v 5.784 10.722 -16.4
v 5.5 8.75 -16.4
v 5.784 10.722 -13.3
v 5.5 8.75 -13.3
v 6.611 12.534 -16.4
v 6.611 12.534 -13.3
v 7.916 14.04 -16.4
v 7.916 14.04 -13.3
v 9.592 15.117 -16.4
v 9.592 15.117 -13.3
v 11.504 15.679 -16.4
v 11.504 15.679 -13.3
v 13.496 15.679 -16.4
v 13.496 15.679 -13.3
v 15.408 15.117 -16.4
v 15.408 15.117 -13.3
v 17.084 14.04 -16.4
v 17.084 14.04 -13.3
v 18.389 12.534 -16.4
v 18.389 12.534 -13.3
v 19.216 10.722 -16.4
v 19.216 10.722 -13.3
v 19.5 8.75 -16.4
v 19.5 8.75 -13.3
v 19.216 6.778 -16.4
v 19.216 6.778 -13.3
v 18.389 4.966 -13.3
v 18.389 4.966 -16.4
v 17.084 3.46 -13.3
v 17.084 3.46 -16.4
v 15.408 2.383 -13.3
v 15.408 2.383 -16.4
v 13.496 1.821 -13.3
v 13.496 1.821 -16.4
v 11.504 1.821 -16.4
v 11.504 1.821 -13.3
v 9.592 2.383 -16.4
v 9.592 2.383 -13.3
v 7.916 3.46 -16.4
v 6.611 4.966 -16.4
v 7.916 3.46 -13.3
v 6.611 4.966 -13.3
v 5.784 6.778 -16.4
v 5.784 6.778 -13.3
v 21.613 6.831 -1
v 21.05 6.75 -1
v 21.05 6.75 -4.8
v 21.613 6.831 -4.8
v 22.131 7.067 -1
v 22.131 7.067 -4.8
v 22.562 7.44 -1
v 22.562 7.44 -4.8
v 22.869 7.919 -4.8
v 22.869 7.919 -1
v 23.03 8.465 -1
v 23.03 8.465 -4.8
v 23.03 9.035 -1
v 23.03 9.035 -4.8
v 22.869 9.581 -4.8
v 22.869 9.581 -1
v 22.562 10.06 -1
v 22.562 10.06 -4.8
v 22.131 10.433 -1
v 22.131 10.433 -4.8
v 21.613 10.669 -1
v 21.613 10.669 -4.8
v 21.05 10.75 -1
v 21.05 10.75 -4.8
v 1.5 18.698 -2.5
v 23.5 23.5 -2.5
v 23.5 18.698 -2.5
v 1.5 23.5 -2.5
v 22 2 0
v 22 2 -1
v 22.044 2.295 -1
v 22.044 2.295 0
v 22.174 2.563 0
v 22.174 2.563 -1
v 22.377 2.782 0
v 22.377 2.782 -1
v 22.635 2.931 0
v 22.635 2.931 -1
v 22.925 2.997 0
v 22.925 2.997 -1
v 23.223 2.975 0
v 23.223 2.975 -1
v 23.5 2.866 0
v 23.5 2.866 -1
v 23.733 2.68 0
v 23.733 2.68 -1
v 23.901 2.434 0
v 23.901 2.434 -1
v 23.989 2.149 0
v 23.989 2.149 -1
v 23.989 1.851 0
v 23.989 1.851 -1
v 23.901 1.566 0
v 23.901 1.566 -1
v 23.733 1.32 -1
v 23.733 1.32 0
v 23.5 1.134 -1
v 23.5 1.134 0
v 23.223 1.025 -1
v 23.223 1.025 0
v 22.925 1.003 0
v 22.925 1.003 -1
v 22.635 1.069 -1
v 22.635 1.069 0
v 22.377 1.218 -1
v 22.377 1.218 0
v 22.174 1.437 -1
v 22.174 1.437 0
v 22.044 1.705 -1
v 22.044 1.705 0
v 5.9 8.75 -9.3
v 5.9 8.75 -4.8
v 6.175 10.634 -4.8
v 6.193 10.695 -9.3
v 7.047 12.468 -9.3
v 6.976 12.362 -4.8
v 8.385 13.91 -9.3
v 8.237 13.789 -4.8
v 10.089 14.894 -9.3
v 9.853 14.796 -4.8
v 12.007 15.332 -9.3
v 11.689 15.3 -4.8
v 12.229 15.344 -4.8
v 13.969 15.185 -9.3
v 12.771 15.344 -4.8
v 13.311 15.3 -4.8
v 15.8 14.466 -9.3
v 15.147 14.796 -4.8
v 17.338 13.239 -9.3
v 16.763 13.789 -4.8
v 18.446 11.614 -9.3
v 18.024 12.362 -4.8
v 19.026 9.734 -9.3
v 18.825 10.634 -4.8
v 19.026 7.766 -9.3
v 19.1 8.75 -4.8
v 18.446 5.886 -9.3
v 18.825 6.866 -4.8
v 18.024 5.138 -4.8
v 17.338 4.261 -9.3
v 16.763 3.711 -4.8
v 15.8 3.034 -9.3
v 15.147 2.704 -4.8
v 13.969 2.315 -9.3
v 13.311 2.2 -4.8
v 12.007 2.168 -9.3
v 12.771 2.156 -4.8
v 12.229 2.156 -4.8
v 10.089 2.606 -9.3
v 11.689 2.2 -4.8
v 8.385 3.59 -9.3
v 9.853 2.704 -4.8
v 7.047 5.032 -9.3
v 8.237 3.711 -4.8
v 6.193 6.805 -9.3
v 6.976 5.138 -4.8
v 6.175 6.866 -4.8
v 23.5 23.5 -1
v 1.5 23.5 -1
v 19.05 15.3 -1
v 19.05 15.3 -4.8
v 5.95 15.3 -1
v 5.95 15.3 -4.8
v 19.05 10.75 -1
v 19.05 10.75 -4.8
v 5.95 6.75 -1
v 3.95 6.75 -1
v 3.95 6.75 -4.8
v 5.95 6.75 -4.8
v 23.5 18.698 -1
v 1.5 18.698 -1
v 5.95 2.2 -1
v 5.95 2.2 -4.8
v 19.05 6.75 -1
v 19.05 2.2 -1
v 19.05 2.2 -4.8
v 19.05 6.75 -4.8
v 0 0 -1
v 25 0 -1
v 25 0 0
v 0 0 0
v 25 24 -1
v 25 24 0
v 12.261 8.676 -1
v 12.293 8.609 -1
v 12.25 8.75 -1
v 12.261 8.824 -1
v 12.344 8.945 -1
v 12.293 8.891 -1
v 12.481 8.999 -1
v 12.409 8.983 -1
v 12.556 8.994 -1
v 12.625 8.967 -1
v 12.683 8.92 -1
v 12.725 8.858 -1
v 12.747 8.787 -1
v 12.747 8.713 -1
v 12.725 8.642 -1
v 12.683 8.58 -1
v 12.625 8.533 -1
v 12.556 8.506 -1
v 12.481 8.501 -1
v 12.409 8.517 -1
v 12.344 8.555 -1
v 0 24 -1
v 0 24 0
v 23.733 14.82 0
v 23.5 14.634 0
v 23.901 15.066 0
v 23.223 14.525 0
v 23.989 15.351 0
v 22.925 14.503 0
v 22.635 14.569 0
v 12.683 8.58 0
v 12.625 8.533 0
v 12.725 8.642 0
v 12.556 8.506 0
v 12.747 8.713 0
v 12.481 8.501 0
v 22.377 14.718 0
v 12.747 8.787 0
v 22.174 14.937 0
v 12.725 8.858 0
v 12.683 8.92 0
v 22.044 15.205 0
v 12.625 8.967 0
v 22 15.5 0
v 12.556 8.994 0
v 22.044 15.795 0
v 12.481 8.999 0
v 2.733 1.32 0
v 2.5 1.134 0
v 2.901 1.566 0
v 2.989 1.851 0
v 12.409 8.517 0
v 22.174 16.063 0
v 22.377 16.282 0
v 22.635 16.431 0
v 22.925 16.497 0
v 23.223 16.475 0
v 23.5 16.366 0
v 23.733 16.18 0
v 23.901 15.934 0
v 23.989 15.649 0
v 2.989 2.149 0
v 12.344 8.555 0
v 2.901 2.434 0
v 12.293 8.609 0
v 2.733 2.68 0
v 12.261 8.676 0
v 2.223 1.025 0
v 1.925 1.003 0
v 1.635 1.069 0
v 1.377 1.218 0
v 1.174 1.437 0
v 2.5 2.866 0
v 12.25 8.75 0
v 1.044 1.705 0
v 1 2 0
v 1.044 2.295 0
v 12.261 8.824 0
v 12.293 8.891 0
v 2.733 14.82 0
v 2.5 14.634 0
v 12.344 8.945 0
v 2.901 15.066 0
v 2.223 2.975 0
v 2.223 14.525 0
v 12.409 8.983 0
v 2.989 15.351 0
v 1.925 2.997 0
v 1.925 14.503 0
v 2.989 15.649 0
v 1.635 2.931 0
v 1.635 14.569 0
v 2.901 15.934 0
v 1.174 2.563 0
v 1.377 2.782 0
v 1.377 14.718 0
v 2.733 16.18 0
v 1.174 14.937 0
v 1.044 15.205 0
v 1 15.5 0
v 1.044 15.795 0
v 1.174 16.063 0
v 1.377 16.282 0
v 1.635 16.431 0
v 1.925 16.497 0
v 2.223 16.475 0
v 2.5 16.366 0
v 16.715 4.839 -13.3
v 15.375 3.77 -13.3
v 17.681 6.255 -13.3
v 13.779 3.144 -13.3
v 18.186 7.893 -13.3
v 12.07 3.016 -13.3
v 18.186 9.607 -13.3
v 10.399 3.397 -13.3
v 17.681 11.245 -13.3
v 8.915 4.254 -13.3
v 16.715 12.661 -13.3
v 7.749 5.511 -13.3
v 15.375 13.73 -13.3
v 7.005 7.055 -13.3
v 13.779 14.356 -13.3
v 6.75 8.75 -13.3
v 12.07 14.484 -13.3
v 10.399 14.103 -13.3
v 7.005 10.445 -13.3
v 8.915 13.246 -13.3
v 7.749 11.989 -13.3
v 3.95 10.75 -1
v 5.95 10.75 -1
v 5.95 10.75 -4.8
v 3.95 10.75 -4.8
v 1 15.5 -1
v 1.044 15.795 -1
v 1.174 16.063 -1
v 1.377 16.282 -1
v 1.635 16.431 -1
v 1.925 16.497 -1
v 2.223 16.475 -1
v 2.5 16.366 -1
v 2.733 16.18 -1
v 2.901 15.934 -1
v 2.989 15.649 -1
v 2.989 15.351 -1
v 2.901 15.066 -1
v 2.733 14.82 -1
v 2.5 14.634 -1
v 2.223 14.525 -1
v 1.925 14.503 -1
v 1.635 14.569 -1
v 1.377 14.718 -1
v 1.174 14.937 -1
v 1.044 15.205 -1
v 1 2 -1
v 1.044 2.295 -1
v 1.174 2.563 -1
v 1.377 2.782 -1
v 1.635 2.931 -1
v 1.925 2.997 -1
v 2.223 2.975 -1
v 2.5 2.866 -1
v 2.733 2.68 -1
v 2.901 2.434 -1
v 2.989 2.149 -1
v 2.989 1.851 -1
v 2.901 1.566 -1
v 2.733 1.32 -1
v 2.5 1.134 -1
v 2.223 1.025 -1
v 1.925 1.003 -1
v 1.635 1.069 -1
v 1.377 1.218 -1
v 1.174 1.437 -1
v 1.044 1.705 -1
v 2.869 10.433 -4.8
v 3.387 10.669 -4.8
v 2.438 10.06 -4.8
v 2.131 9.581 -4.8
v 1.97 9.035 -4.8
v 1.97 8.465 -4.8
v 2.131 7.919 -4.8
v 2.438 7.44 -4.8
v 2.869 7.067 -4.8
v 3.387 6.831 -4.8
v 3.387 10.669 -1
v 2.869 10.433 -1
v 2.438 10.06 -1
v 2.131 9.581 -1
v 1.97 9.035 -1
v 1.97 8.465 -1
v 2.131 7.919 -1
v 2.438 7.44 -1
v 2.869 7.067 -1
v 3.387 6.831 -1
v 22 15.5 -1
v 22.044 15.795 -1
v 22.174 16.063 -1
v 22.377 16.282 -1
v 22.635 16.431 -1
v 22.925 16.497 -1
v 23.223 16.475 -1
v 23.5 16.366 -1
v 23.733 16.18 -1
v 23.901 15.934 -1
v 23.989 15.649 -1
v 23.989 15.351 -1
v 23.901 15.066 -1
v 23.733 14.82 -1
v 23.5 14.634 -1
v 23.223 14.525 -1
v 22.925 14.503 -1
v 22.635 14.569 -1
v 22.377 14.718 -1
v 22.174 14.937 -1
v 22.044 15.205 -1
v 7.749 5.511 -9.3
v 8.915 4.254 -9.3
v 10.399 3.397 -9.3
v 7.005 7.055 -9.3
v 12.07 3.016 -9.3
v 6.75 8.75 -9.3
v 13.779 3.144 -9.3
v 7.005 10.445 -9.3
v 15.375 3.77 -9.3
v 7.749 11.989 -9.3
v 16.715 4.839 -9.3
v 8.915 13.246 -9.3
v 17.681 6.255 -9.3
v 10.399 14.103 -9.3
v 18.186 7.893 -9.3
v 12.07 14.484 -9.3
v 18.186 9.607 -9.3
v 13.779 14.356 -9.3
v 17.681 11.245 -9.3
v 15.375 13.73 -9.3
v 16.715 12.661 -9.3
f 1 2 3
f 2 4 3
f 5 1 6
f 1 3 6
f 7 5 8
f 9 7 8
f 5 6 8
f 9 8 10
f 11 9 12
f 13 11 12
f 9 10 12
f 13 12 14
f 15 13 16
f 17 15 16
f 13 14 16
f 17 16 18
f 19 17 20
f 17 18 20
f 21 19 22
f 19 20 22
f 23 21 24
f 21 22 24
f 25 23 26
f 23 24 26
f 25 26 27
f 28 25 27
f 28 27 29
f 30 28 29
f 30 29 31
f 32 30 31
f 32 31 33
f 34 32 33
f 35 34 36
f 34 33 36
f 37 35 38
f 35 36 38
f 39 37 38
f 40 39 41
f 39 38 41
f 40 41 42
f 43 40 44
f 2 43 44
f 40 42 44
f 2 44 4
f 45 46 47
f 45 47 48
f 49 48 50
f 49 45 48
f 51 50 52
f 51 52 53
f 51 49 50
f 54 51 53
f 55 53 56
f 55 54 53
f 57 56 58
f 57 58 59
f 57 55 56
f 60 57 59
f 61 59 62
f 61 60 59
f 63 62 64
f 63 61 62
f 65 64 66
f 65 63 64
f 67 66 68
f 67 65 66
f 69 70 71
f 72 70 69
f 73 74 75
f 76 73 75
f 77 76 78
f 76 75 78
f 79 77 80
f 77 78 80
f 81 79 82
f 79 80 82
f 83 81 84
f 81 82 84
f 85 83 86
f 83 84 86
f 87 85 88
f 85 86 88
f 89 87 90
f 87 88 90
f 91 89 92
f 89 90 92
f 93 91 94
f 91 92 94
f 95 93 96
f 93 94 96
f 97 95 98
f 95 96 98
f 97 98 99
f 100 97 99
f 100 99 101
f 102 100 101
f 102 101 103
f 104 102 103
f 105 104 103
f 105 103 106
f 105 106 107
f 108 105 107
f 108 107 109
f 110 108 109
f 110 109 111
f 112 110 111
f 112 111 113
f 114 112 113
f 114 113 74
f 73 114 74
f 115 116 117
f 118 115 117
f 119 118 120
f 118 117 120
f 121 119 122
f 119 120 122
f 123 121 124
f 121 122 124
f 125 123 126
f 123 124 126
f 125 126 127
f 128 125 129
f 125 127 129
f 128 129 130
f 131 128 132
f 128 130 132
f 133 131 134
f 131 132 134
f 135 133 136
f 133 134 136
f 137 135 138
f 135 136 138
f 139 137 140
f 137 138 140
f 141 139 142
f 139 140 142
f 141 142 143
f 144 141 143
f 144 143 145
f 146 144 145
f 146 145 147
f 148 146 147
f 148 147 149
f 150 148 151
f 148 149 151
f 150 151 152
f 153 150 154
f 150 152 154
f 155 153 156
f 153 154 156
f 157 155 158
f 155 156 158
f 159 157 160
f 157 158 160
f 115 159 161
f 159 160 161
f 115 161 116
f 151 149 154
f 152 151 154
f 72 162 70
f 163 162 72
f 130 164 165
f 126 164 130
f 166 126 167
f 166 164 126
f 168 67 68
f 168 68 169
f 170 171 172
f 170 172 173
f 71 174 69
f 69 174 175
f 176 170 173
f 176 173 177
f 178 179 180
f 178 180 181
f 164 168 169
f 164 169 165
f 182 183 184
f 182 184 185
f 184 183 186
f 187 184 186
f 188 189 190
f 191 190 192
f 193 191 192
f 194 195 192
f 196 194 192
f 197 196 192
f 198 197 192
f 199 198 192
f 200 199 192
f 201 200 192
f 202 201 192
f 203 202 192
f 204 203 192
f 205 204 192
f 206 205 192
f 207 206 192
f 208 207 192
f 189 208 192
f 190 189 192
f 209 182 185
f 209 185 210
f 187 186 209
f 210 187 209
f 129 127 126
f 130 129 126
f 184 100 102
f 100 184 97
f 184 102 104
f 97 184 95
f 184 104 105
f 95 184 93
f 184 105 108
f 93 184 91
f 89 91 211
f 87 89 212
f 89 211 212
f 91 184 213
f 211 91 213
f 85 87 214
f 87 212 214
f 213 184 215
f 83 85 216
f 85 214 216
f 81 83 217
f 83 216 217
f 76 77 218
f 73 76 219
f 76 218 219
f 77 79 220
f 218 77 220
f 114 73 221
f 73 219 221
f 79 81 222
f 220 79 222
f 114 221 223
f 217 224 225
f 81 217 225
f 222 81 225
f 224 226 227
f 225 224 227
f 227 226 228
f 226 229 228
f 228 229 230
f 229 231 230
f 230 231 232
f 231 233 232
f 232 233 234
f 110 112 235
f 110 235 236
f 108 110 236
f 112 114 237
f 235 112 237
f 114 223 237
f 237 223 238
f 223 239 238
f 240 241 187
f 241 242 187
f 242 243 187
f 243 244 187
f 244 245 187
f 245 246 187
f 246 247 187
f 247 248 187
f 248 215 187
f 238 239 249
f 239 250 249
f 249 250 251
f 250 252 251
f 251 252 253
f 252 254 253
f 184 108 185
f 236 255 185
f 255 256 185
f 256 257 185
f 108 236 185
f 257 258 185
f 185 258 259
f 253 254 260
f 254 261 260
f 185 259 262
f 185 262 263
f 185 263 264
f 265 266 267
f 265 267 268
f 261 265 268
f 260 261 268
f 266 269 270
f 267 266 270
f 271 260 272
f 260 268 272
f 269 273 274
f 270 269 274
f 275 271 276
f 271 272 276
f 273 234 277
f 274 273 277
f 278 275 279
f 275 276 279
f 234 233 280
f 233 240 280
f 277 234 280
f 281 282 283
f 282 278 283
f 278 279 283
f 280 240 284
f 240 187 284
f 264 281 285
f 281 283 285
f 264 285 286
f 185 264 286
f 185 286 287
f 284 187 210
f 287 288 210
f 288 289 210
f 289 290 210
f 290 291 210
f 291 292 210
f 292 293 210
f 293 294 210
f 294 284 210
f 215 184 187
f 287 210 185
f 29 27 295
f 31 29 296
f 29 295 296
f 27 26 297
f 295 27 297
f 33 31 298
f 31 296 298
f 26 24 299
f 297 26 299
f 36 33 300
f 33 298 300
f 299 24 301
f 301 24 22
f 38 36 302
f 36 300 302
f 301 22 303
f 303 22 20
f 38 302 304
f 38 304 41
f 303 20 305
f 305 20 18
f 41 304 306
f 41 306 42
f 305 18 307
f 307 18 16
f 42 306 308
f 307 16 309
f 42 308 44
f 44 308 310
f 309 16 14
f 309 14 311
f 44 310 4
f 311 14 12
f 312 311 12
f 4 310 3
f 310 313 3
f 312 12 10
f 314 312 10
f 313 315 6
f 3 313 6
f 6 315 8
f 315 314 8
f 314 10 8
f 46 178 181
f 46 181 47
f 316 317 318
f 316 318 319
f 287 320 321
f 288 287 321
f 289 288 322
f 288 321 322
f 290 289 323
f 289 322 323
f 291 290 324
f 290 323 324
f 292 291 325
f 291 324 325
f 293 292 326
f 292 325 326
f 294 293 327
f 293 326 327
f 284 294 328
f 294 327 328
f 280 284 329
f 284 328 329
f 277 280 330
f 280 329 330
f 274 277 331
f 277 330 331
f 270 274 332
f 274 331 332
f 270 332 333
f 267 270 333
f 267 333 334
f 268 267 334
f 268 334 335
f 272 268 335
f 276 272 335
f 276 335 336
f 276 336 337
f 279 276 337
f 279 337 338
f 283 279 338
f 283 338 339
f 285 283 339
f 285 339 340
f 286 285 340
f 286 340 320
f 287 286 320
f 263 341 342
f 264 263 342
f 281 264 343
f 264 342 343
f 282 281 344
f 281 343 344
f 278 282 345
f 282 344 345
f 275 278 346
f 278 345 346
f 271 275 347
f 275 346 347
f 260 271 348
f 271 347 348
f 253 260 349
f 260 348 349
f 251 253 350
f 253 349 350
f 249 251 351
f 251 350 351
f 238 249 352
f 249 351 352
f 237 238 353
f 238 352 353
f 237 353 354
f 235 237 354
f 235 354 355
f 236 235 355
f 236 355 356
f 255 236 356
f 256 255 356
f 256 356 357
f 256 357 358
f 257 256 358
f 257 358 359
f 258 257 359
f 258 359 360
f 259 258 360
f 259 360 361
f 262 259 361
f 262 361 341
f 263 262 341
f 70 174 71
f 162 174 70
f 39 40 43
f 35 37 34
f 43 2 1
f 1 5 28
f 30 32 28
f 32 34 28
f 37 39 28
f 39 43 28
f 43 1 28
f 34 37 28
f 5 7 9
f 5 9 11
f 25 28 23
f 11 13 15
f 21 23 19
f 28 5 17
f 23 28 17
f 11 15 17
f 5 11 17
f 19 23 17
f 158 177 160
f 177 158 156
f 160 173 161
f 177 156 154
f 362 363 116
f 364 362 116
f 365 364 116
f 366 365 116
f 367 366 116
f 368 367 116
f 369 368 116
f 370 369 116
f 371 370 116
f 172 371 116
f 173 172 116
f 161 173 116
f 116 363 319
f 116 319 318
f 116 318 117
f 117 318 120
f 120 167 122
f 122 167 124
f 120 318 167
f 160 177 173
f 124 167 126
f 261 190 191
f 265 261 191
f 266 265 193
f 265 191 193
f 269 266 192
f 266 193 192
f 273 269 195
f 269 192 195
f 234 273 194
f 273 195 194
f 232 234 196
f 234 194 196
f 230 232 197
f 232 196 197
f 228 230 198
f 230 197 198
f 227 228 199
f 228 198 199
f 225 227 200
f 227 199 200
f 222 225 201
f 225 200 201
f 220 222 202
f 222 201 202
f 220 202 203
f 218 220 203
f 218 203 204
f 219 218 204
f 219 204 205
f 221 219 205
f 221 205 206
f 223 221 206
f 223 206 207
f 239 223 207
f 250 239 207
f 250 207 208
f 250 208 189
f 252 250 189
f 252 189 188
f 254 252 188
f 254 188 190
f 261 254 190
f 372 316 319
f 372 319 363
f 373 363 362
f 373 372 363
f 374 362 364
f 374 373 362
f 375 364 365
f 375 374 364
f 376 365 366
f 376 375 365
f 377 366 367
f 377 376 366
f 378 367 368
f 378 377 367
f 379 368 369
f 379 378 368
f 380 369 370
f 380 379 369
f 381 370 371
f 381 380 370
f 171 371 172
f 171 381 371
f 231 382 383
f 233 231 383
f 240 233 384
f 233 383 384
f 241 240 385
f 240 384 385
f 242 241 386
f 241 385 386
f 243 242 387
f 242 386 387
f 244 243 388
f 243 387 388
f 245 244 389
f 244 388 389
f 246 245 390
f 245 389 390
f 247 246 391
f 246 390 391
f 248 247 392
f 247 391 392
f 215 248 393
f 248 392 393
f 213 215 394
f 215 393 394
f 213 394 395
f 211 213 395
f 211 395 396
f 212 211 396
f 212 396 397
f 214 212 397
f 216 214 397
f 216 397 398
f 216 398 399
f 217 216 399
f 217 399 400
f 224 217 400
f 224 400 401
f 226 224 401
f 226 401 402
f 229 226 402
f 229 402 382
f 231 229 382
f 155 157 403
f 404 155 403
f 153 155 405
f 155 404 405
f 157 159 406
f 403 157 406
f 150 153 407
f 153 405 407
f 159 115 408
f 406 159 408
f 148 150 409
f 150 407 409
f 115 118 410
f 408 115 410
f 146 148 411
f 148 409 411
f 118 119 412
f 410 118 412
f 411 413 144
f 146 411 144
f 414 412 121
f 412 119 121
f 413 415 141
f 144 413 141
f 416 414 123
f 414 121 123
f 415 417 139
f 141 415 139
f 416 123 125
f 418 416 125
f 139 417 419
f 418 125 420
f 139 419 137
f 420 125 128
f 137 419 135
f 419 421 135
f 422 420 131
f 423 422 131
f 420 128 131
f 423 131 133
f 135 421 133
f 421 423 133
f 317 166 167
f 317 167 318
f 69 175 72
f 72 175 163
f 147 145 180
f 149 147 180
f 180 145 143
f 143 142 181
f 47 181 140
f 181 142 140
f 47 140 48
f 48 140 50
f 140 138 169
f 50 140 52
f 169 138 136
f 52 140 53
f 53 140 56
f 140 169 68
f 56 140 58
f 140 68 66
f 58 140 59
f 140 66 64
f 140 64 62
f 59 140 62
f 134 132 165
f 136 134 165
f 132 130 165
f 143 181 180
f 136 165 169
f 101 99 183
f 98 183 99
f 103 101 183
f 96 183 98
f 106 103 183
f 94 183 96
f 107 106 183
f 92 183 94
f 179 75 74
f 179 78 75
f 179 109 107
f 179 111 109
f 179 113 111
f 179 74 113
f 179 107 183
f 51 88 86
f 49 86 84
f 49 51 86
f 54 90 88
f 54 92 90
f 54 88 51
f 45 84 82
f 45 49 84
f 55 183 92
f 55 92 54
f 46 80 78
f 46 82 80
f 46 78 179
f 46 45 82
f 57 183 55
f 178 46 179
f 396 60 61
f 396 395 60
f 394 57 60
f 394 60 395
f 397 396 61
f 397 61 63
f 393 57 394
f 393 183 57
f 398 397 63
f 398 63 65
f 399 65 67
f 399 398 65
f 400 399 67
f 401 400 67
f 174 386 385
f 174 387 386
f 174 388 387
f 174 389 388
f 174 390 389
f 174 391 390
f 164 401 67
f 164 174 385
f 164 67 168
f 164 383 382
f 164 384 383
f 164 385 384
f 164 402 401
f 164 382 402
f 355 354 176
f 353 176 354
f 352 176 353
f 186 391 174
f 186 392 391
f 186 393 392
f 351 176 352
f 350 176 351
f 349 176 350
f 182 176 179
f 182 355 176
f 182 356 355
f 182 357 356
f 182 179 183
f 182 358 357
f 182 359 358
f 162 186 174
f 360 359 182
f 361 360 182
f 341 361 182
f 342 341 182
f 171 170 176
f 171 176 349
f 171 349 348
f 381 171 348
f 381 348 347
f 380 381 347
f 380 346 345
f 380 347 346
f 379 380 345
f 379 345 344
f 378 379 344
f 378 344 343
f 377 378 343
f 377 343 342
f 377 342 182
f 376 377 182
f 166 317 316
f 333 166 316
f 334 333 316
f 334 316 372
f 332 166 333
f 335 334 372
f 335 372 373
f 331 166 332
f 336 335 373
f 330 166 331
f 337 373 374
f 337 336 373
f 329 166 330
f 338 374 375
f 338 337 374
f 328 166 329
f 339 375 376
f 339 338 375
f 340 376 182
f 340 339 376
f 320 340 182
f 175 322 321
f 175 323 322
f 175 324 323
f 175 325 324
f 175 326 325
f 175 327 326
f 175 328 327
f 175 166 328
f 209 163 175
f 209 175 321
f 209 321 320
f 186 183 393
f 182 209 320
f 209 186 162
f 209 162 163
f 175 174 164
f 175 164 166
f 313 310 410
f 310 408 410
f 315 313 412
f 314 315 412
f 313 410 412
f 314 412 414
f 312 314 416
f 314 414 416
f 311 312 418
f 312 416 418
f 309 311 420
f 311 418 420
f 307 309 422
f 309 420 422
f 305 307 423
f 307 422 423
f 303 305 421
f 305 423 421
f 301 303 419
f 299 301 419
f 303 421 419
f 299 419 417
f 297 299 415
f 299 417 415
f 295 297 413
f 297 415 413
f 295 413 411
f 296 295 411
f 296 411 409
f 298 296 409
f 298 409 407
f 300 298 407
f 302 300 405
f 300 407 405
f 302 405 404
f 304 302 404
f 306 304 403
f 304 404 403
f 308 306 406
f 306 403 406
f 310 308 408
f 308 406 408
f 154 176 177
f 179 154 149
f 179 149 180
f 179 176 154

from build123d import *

# Parameters (mm, degrees)
SKETCH_1_W             = 25
SKETCH_1_H             = 24
EXTRUDE_271_DEPTH      = 1
EXTRUDE_458_DEPTH      = 3.8
SKETCH_3_W             = 22
SKETCH_3_H             = 4.802295703
EXTRUDE_725_DEPTH      = 1.5
HOLE_WIZARD_886_D      = 0.5
HOLE_WIZARD_886_DEPTH  = 1
HOLE_WIZARD_1548_D     = 2
HOLE_WIZARD_1548_DEPTH = 16.4


with BuildPart() as part:
    # Эскиз1 → Extrude 271 (new body)
    with BuildSketch(Plane(origin=(0, 0, -1), x_dir=(-1, 0, 0), z_dir=(0, 0, -1))):
        with Locations((-12.5, 12)):
            Rectangle(SKETCH_1_W, SKETCH_1_H)
    extrude(amount=-EXTRUDE_271_DEPTH)

    # Эскиз2 → Extrude 458 (add)
    with BuildSketch(Plane(origin=(0, 0, -1), x_dir=(-1, 0, 0), z_dir=(0, 0, -1))):
        with BuildLine():
            Line((-5.95, 10.75), (-3.949995117, 10.75))
            ThreePointArc((-3.949995117, 10.75), (-1.949995117, 8.75), (-3.949995117, 6.75))
            Line((-3.949995117, 6.75), (-5.95, 6.75))
            Line((-5.95, 6.75), (-5.95, 2.2))
            Line((-5.95, 2.2), (-19.05, 2.2))
            Line((-19.05, 2.2), (-19.05, 6.75))
            Line((-19.05, 6.75), (-21.050009766, 6.75))
            ThreePointArc((-21.050009766, 6.75), (-23.050009766, 8.75), (-21.050009766, 10.75))
            Line((-21.050009766, 10.75), (-19.05, 10.75))
            Line((-19.05, 10.75), (-19.05, 15.3))
            Line((-19.05, 15.3), (-5.95, 15.3))
            Line((-5.95, 15.3), (-5.95, 10.75))
        make_face()
    extrude(amount=EXTRUDE_458_DEPTH)

    # Эскиз3 → Extrude 725 (add)
    with BuildSketch(Plane(origin=(0, 0, -1), x_dir=(-1, 0, 0), z_dir=(0, 0, -1))):
        with Locations((-12.5, 21.098852149)):
            Rectangle(SKETCH_3_W, SKETCH_3_H)
    extrude(amount=EXTRUDE_725_DEPTH)

    # Эскиз4 → Revolve 834 (revolve)
    with BuildSketch(Plane.XZ.offset(-8.75), mode=Mode.PRIVATE) as revolve_834_sk:
        Polygon((19.1, -4.8), (12.5, -4.8), (12.5, -16.4), (19.5, -16.4), (19.5, -13.3), (18.25, -13.3), (18.25, -9.3), (19.1, -9.3), align=None)
    revolve(revolve_834_sk.sketch.rotate(Axis((12.5, 8.75, -4.8), (0, 0, -1)), 180), axis=Axis((12.5, 8.75, -4.8), (0, 0, -1)))

    # Hole Wizard 886
    with Locations(Plane.XY):
        with Locations((12.5, 8.75)):
            Hole(HOLE_WIZARD_886_D / 2, depth=HOLE_WIZARD_886_DEPTH)

    # Hole Wizard 1548
    with Locations(Plane.XY):
        with Locations((2, 2), (2, 15.5), (23, 15.5), (23, 2)):
            Hole(HOLE_WIZARD_1548_D / 2, depth=HOLE_WIZARD_1548_DEPTH)


solid = part.part
